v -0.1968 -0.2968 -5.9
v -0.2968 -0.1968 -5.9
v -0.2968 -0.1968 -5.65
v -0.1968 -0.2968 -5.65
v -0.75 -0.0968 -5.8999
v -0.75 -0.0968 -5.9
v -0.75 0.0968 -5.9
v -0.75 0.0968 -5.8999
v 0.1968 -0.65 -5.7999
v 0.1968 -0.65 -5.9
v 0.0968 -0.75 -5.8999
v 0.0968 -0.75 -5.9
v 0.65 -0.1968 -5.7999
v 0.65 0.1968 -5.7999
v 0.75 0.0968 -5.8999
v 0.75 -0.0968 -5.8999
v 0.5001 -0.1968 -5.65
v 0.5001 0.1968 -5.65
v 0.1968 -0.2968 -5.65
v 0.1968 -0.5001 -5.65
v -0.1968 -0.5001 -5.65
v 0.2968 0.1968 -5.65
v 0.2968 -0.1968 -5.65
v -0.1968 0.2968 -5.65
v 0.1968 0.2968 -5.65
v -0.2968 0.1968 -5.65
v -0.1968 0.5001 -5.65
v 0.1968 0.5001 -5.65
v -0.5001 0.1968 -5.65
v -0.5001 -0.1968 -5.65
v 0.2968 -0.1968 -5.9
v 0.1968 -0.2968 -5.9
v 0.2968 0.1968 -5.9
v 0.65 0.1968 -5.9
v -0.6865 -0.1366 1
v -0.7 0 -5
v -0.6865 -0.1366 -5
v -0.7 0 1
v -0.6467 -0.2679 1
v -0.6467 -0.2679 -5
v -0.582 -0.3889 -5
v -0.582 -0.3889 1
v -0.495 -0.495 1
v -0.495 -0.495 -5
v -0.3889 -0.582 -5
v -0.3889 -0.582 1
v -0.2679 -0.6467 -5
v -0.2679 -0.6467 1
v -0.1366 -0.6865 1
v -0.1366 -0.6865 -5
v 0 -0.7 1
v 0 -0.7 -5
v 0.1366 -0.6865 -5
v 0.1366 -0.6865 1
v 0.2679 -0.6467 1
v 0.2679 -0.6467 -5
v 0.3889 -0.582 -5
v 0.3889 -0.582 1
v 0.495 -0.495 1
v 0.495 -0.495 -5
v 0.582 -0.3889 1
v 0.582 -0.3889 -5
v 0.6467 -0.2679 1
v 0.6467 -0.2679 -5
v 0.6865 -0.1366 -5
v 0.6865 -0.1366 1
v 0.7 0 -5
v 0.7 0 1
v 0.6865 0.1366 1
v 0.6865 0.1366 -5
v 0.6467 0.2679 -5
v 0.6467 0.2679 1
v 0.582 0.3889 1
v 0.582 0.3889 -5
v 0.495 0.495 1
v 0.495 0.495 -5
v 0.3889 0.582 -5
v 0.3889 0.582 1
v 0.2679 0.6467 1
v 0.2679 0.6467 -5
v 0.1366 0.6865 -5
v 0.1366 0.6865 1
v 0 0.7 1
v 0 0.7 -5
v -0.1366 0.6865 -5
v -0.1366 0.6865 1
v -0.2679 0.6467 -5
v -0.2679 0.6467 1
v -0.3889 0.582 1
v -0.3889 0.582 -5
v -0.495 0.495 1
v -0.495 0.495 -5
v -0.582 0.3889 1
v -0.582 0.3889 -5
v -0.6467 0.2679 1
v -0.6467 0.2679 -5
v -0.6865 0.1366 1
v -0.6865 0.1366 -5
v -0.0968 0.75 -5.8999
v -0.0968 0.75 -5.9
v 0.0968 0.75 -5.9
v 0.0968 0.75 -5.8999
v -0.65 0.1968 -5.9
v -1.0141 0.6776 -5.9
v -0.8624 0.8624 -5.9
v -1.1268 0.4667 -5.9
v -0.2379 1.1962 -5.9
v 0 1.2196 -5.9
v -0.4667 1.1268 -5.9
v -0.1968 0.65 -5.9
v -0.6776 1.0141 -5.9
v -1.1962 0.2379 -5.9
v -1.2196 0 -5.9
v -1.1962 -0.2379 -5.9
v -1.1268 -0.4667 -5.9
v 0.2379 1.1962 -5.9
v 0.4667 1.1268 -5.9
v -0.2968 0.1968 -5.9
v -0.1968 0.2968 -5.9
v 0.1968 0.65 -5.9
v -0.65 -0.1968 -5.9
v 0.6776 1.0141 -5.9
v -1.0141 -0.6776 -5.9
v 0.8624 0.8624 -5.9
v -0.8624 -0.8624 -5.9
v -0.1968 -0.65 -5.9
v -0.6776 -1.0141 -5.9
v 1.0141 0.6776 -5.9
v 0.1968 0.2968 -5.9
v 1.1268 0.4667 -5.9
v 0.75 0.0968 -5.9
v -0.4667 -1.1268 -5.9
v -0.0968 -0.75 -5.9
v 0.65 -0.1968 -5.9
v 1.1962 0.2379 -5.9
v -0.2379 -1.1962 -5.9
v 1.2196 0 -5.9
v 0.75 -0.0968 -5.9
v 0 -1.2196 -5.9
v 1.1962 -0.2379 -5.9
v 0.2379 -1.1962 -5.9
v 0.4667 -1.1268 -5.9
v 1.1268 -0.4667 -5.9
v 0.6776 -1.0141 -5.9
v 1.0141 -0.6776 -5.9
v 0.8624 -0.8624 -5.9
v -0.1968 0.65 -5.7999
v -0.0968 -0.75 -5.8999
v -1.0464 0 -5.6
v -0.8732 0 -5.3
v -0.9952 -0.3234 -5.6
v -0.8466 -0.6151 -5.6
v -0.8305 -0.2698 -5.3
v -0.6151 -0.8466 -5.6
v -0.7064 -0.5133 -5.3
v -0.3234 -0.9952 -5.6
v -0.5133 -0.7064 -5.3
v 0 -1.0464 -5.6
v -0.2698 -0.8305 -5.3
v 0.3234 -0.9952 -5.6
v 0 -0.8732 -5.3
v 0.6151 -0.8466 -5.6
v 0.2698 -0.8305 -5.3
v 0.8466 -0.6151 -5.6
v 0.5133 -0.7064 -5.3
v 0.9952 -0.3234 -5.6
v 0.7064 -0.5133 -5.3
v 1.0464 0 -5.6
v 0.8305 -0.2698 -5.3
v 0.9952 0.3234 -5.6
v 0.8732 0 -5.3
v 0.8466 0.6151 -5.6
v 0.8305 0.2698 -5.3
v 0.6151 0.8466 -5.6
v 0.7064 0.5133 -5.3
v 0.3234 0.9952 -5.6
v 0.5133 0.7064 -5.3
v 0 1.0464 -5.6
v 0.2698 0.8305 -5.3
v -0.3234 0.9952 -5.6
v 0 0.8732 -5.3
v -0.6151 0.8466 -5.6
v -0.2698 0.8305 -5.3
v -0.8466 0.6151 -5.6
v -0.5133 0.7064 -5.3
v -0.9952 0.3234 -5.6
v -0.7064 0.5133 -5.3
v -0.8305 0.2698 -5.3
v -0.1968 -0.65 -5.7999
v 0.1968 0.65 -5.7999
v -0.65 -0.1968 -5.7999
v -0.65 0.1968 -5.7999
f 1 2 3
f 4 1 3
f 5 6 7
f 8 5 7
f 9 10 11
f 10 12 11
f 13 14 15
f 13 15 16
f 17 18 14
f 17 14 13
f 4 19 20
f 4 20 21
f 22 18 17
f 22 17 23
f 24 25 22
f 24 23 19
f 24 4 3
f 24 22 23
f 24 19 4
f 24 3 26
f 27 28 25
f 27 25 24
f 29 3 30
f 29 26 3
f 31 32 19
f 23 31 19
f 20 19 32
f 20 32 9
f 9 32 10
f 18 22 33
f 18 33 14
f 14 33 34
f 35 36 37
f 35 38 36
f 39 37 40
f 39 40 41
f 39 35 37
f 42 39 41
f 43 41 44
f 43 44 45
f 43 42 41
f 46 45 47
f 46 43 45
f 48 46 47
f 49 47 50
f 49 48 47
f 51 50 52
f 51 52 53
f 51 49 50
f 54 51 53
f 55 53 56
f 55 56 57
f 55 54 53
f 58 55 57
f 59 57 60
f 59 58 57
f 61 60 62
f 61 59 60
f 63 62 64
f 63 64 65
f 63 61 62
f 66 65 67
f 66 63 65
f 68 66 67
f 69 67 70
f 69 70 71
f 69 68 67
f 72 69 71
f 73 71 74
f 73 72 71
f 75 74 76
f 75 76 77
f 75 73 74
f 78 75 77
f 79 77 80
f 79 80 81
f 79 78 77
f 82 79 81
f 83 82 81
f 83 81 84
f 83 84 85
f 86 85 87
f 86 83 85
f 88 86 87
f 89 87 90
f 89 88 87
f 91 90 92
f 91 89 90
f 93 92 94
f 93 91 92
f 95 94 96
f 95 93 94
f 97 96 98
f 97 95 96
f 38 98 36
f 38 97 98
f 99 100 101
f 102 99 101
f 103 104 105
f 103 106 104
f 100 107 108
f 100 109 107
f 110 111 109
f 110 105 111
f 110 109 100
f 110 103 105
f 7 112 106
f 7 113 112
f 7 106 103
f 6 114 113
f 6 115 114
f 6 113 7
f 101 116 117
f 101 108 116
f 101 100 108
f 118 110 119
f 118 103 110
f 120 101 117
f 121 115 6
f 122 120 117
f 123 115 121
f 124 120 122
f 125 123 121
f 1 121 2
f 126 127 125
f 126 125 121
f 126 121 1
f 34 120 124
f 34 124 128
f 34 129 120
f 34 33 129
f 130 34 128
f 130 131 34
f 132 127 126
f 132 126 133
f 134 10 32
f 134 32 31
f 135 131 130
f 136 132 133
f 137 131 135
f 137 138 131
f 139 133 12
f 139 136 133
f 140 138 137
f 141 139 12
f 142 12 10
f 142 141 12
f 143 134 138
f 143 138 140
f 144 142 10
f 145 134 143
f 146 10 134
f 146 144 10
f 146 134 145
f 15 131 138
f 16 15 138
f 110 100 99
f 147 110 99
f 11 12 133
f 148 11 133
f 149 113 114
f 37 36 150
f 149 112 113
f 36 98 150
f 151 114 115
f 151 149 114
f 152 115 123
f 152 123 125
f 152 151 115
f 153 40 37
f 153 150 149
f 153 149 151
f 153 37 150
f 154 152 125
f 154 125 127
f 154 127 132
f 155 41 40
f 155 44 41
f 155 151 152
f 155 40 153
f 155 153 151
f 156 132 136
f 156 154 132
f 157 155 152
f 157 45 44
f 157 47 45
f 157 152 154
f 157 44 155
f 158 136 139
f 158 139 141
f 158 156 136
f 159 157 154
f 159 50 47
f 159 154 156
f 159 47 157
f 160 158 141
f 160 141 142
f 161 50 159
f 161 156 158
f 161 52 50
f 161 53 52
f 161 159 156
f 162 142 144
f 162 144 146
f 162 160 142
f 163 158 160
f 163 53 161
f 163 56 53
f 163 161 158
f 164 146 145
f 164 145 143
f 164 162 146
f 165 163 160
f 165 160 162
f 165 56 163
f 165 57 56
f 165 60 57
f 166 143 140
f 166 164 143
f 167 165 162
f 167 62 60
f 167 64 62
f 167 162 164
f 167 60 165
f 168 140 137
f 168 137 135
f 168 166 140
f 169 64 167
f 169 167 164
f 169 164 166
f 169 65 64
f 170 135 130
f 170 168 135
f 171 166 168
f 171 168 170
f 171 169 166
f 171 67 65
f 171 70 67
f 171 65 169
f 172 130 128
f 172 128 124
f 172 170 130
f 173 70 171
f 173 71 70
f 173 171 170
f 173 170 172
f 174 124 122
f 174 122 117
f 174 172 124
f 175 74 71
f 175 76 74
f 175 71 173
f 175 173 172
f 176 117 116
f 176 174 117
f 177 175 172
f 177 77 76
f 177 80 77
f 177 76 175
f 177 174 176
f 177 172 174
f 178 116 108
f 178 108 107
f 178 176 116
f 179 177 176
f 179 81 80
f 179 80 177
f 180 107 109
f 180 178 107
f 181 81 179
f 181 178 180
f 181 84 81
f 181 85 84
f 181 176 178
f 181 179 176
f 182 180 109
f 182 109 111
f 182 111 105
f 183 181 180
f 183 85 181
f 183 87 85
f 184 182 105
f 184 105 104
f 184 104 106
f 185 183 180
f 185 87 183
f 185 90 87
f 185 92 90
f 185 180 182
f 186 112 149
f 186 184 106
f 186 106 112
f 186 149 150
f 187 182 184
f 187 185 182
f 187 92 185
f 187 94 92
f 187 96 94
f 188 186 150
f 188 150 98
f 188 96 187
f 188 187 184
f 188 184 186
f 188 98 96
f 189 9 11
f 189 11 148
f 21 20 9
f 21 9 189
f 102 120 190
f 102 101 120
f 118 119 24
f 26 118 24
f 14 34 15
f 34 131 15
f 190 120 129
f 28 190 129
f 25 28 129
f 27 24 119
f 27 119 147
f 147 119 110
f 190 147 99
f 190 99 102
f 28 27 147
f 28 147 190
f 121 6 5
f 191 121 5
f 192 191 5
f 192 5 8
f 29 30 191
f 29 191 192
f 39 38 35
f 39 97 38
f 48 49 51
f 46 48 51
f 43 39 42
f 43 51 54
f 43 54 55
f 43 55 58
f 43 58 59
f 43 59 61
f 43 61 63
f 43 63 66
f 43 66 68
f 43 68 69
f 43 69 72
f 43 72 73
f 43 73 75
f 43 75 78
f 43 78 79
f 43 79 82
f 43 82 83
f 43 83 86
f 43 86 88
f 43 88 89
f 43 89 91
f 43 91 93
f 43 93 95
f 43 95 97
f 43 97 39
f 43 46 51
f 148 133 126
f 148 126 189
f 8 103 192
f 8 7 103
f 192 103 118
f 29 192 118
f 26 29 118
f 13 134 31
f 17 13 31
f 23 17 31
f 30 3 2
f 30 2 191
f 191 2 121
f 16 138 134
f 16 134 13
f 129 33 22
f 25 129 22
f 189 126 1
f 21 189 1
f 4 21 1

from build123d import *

# Parameters (mm, degrees)
CUT_EXTRUDE1_DEPTH = 0.25
CHAMFER1_SIZE      = 0.1
CHAMFER2_SIZE      = 0.1
CHAMFER3_SIZE      = 0.25


with BuildPart() as part:
    # Sketch2 → Revolve1 (revolve)
    with BuildSketch(Plane(origin=(0, 0, 0), x_dir=(1, 0, 0), z_dir=(0, 1, 0))):
        Polygon((0, 0), (0, 5.9), (-1.219615242, 5.9), (-0.7, 5), (-0.7, -1), (0, -1), align=None)
    revolve(axis=Axis((0, 0, -52.449576884), (0, 0, 1)))

    # Sketch4 → Cut-Extrude1 (cut)
    with BuildSketch(Plane(origin=(0, 0, -5.9), x_dir=(-1, 0, 0), z_dir=(0, 0, -1))):
        Polygon((0, 0.75), (-0.196763203, 0.75), (-0.196763203, 0.196763203), (-0.75, 0.196763203), (-0.75, -0.196763203), (-0.196763203, -0.196763203), (-0.196763203, -0.75), (0.196763203, -0.75), (0.196763203, -0.196763203), (0.75, -0.196763203), (0.75, 0.196763203), (0.196763203, 0.196763203), (0.196763203, 0.75), align=None)
    extrude(amount=-CUT_EXTRUDE1_DEPTH, mode=Mode.SUBTRACT)

    # Chamfer1
    chamfer1_edges = [part.edges().sort_by_distance(p)[0] for p in [
        (-0.196763203, 0.196763203, -5.775),
        (-0.196763203, -0.196763203, -5.775),
        (0.196763203, -0.196763203, -5.775),
        (0.196763203, 0.196763203, -5.775),
    ]]
    chamfer(chamfer1_edges, length=CHAMFER1_SIZE)

    # Chamfer2
    chamfer2_edges = [part.edges().sort_by_distance(p)[0] for p in [
        (-0.196763203, 0.75, -5.775),
        (-0.75, 0.196763203, -5.775),
        (-0.75, -0.196763203, -5.775),
        (-0.196763203, -0.75, -5.775),
        (0.196763203, -0.75, -5.775),
        (0.75, -0.196763203, -5.775),
        (0.75, 0.196763203, -5.775),
        (0.196763203, 0.75, -5.775),
    ]]
    chamfer(chamfer2_edges, length=CHAMFER2_SIZE)

    # Chamfer3
    chamfer3_edges = [part.edges().sort_by_distance(p)[0] for p in [
        (0, -0.75, -5.65),
        (0.75, 0, -5.65),
        (-0.75, 0, -5.65),
        (0, 0.75, -5.65),
    ]]
    chamfer(chamfer3_edges, length=CHAMFER3_SIZE - 0.0001)  # a hair under: the kernel refuses the full size


solid = part.part
